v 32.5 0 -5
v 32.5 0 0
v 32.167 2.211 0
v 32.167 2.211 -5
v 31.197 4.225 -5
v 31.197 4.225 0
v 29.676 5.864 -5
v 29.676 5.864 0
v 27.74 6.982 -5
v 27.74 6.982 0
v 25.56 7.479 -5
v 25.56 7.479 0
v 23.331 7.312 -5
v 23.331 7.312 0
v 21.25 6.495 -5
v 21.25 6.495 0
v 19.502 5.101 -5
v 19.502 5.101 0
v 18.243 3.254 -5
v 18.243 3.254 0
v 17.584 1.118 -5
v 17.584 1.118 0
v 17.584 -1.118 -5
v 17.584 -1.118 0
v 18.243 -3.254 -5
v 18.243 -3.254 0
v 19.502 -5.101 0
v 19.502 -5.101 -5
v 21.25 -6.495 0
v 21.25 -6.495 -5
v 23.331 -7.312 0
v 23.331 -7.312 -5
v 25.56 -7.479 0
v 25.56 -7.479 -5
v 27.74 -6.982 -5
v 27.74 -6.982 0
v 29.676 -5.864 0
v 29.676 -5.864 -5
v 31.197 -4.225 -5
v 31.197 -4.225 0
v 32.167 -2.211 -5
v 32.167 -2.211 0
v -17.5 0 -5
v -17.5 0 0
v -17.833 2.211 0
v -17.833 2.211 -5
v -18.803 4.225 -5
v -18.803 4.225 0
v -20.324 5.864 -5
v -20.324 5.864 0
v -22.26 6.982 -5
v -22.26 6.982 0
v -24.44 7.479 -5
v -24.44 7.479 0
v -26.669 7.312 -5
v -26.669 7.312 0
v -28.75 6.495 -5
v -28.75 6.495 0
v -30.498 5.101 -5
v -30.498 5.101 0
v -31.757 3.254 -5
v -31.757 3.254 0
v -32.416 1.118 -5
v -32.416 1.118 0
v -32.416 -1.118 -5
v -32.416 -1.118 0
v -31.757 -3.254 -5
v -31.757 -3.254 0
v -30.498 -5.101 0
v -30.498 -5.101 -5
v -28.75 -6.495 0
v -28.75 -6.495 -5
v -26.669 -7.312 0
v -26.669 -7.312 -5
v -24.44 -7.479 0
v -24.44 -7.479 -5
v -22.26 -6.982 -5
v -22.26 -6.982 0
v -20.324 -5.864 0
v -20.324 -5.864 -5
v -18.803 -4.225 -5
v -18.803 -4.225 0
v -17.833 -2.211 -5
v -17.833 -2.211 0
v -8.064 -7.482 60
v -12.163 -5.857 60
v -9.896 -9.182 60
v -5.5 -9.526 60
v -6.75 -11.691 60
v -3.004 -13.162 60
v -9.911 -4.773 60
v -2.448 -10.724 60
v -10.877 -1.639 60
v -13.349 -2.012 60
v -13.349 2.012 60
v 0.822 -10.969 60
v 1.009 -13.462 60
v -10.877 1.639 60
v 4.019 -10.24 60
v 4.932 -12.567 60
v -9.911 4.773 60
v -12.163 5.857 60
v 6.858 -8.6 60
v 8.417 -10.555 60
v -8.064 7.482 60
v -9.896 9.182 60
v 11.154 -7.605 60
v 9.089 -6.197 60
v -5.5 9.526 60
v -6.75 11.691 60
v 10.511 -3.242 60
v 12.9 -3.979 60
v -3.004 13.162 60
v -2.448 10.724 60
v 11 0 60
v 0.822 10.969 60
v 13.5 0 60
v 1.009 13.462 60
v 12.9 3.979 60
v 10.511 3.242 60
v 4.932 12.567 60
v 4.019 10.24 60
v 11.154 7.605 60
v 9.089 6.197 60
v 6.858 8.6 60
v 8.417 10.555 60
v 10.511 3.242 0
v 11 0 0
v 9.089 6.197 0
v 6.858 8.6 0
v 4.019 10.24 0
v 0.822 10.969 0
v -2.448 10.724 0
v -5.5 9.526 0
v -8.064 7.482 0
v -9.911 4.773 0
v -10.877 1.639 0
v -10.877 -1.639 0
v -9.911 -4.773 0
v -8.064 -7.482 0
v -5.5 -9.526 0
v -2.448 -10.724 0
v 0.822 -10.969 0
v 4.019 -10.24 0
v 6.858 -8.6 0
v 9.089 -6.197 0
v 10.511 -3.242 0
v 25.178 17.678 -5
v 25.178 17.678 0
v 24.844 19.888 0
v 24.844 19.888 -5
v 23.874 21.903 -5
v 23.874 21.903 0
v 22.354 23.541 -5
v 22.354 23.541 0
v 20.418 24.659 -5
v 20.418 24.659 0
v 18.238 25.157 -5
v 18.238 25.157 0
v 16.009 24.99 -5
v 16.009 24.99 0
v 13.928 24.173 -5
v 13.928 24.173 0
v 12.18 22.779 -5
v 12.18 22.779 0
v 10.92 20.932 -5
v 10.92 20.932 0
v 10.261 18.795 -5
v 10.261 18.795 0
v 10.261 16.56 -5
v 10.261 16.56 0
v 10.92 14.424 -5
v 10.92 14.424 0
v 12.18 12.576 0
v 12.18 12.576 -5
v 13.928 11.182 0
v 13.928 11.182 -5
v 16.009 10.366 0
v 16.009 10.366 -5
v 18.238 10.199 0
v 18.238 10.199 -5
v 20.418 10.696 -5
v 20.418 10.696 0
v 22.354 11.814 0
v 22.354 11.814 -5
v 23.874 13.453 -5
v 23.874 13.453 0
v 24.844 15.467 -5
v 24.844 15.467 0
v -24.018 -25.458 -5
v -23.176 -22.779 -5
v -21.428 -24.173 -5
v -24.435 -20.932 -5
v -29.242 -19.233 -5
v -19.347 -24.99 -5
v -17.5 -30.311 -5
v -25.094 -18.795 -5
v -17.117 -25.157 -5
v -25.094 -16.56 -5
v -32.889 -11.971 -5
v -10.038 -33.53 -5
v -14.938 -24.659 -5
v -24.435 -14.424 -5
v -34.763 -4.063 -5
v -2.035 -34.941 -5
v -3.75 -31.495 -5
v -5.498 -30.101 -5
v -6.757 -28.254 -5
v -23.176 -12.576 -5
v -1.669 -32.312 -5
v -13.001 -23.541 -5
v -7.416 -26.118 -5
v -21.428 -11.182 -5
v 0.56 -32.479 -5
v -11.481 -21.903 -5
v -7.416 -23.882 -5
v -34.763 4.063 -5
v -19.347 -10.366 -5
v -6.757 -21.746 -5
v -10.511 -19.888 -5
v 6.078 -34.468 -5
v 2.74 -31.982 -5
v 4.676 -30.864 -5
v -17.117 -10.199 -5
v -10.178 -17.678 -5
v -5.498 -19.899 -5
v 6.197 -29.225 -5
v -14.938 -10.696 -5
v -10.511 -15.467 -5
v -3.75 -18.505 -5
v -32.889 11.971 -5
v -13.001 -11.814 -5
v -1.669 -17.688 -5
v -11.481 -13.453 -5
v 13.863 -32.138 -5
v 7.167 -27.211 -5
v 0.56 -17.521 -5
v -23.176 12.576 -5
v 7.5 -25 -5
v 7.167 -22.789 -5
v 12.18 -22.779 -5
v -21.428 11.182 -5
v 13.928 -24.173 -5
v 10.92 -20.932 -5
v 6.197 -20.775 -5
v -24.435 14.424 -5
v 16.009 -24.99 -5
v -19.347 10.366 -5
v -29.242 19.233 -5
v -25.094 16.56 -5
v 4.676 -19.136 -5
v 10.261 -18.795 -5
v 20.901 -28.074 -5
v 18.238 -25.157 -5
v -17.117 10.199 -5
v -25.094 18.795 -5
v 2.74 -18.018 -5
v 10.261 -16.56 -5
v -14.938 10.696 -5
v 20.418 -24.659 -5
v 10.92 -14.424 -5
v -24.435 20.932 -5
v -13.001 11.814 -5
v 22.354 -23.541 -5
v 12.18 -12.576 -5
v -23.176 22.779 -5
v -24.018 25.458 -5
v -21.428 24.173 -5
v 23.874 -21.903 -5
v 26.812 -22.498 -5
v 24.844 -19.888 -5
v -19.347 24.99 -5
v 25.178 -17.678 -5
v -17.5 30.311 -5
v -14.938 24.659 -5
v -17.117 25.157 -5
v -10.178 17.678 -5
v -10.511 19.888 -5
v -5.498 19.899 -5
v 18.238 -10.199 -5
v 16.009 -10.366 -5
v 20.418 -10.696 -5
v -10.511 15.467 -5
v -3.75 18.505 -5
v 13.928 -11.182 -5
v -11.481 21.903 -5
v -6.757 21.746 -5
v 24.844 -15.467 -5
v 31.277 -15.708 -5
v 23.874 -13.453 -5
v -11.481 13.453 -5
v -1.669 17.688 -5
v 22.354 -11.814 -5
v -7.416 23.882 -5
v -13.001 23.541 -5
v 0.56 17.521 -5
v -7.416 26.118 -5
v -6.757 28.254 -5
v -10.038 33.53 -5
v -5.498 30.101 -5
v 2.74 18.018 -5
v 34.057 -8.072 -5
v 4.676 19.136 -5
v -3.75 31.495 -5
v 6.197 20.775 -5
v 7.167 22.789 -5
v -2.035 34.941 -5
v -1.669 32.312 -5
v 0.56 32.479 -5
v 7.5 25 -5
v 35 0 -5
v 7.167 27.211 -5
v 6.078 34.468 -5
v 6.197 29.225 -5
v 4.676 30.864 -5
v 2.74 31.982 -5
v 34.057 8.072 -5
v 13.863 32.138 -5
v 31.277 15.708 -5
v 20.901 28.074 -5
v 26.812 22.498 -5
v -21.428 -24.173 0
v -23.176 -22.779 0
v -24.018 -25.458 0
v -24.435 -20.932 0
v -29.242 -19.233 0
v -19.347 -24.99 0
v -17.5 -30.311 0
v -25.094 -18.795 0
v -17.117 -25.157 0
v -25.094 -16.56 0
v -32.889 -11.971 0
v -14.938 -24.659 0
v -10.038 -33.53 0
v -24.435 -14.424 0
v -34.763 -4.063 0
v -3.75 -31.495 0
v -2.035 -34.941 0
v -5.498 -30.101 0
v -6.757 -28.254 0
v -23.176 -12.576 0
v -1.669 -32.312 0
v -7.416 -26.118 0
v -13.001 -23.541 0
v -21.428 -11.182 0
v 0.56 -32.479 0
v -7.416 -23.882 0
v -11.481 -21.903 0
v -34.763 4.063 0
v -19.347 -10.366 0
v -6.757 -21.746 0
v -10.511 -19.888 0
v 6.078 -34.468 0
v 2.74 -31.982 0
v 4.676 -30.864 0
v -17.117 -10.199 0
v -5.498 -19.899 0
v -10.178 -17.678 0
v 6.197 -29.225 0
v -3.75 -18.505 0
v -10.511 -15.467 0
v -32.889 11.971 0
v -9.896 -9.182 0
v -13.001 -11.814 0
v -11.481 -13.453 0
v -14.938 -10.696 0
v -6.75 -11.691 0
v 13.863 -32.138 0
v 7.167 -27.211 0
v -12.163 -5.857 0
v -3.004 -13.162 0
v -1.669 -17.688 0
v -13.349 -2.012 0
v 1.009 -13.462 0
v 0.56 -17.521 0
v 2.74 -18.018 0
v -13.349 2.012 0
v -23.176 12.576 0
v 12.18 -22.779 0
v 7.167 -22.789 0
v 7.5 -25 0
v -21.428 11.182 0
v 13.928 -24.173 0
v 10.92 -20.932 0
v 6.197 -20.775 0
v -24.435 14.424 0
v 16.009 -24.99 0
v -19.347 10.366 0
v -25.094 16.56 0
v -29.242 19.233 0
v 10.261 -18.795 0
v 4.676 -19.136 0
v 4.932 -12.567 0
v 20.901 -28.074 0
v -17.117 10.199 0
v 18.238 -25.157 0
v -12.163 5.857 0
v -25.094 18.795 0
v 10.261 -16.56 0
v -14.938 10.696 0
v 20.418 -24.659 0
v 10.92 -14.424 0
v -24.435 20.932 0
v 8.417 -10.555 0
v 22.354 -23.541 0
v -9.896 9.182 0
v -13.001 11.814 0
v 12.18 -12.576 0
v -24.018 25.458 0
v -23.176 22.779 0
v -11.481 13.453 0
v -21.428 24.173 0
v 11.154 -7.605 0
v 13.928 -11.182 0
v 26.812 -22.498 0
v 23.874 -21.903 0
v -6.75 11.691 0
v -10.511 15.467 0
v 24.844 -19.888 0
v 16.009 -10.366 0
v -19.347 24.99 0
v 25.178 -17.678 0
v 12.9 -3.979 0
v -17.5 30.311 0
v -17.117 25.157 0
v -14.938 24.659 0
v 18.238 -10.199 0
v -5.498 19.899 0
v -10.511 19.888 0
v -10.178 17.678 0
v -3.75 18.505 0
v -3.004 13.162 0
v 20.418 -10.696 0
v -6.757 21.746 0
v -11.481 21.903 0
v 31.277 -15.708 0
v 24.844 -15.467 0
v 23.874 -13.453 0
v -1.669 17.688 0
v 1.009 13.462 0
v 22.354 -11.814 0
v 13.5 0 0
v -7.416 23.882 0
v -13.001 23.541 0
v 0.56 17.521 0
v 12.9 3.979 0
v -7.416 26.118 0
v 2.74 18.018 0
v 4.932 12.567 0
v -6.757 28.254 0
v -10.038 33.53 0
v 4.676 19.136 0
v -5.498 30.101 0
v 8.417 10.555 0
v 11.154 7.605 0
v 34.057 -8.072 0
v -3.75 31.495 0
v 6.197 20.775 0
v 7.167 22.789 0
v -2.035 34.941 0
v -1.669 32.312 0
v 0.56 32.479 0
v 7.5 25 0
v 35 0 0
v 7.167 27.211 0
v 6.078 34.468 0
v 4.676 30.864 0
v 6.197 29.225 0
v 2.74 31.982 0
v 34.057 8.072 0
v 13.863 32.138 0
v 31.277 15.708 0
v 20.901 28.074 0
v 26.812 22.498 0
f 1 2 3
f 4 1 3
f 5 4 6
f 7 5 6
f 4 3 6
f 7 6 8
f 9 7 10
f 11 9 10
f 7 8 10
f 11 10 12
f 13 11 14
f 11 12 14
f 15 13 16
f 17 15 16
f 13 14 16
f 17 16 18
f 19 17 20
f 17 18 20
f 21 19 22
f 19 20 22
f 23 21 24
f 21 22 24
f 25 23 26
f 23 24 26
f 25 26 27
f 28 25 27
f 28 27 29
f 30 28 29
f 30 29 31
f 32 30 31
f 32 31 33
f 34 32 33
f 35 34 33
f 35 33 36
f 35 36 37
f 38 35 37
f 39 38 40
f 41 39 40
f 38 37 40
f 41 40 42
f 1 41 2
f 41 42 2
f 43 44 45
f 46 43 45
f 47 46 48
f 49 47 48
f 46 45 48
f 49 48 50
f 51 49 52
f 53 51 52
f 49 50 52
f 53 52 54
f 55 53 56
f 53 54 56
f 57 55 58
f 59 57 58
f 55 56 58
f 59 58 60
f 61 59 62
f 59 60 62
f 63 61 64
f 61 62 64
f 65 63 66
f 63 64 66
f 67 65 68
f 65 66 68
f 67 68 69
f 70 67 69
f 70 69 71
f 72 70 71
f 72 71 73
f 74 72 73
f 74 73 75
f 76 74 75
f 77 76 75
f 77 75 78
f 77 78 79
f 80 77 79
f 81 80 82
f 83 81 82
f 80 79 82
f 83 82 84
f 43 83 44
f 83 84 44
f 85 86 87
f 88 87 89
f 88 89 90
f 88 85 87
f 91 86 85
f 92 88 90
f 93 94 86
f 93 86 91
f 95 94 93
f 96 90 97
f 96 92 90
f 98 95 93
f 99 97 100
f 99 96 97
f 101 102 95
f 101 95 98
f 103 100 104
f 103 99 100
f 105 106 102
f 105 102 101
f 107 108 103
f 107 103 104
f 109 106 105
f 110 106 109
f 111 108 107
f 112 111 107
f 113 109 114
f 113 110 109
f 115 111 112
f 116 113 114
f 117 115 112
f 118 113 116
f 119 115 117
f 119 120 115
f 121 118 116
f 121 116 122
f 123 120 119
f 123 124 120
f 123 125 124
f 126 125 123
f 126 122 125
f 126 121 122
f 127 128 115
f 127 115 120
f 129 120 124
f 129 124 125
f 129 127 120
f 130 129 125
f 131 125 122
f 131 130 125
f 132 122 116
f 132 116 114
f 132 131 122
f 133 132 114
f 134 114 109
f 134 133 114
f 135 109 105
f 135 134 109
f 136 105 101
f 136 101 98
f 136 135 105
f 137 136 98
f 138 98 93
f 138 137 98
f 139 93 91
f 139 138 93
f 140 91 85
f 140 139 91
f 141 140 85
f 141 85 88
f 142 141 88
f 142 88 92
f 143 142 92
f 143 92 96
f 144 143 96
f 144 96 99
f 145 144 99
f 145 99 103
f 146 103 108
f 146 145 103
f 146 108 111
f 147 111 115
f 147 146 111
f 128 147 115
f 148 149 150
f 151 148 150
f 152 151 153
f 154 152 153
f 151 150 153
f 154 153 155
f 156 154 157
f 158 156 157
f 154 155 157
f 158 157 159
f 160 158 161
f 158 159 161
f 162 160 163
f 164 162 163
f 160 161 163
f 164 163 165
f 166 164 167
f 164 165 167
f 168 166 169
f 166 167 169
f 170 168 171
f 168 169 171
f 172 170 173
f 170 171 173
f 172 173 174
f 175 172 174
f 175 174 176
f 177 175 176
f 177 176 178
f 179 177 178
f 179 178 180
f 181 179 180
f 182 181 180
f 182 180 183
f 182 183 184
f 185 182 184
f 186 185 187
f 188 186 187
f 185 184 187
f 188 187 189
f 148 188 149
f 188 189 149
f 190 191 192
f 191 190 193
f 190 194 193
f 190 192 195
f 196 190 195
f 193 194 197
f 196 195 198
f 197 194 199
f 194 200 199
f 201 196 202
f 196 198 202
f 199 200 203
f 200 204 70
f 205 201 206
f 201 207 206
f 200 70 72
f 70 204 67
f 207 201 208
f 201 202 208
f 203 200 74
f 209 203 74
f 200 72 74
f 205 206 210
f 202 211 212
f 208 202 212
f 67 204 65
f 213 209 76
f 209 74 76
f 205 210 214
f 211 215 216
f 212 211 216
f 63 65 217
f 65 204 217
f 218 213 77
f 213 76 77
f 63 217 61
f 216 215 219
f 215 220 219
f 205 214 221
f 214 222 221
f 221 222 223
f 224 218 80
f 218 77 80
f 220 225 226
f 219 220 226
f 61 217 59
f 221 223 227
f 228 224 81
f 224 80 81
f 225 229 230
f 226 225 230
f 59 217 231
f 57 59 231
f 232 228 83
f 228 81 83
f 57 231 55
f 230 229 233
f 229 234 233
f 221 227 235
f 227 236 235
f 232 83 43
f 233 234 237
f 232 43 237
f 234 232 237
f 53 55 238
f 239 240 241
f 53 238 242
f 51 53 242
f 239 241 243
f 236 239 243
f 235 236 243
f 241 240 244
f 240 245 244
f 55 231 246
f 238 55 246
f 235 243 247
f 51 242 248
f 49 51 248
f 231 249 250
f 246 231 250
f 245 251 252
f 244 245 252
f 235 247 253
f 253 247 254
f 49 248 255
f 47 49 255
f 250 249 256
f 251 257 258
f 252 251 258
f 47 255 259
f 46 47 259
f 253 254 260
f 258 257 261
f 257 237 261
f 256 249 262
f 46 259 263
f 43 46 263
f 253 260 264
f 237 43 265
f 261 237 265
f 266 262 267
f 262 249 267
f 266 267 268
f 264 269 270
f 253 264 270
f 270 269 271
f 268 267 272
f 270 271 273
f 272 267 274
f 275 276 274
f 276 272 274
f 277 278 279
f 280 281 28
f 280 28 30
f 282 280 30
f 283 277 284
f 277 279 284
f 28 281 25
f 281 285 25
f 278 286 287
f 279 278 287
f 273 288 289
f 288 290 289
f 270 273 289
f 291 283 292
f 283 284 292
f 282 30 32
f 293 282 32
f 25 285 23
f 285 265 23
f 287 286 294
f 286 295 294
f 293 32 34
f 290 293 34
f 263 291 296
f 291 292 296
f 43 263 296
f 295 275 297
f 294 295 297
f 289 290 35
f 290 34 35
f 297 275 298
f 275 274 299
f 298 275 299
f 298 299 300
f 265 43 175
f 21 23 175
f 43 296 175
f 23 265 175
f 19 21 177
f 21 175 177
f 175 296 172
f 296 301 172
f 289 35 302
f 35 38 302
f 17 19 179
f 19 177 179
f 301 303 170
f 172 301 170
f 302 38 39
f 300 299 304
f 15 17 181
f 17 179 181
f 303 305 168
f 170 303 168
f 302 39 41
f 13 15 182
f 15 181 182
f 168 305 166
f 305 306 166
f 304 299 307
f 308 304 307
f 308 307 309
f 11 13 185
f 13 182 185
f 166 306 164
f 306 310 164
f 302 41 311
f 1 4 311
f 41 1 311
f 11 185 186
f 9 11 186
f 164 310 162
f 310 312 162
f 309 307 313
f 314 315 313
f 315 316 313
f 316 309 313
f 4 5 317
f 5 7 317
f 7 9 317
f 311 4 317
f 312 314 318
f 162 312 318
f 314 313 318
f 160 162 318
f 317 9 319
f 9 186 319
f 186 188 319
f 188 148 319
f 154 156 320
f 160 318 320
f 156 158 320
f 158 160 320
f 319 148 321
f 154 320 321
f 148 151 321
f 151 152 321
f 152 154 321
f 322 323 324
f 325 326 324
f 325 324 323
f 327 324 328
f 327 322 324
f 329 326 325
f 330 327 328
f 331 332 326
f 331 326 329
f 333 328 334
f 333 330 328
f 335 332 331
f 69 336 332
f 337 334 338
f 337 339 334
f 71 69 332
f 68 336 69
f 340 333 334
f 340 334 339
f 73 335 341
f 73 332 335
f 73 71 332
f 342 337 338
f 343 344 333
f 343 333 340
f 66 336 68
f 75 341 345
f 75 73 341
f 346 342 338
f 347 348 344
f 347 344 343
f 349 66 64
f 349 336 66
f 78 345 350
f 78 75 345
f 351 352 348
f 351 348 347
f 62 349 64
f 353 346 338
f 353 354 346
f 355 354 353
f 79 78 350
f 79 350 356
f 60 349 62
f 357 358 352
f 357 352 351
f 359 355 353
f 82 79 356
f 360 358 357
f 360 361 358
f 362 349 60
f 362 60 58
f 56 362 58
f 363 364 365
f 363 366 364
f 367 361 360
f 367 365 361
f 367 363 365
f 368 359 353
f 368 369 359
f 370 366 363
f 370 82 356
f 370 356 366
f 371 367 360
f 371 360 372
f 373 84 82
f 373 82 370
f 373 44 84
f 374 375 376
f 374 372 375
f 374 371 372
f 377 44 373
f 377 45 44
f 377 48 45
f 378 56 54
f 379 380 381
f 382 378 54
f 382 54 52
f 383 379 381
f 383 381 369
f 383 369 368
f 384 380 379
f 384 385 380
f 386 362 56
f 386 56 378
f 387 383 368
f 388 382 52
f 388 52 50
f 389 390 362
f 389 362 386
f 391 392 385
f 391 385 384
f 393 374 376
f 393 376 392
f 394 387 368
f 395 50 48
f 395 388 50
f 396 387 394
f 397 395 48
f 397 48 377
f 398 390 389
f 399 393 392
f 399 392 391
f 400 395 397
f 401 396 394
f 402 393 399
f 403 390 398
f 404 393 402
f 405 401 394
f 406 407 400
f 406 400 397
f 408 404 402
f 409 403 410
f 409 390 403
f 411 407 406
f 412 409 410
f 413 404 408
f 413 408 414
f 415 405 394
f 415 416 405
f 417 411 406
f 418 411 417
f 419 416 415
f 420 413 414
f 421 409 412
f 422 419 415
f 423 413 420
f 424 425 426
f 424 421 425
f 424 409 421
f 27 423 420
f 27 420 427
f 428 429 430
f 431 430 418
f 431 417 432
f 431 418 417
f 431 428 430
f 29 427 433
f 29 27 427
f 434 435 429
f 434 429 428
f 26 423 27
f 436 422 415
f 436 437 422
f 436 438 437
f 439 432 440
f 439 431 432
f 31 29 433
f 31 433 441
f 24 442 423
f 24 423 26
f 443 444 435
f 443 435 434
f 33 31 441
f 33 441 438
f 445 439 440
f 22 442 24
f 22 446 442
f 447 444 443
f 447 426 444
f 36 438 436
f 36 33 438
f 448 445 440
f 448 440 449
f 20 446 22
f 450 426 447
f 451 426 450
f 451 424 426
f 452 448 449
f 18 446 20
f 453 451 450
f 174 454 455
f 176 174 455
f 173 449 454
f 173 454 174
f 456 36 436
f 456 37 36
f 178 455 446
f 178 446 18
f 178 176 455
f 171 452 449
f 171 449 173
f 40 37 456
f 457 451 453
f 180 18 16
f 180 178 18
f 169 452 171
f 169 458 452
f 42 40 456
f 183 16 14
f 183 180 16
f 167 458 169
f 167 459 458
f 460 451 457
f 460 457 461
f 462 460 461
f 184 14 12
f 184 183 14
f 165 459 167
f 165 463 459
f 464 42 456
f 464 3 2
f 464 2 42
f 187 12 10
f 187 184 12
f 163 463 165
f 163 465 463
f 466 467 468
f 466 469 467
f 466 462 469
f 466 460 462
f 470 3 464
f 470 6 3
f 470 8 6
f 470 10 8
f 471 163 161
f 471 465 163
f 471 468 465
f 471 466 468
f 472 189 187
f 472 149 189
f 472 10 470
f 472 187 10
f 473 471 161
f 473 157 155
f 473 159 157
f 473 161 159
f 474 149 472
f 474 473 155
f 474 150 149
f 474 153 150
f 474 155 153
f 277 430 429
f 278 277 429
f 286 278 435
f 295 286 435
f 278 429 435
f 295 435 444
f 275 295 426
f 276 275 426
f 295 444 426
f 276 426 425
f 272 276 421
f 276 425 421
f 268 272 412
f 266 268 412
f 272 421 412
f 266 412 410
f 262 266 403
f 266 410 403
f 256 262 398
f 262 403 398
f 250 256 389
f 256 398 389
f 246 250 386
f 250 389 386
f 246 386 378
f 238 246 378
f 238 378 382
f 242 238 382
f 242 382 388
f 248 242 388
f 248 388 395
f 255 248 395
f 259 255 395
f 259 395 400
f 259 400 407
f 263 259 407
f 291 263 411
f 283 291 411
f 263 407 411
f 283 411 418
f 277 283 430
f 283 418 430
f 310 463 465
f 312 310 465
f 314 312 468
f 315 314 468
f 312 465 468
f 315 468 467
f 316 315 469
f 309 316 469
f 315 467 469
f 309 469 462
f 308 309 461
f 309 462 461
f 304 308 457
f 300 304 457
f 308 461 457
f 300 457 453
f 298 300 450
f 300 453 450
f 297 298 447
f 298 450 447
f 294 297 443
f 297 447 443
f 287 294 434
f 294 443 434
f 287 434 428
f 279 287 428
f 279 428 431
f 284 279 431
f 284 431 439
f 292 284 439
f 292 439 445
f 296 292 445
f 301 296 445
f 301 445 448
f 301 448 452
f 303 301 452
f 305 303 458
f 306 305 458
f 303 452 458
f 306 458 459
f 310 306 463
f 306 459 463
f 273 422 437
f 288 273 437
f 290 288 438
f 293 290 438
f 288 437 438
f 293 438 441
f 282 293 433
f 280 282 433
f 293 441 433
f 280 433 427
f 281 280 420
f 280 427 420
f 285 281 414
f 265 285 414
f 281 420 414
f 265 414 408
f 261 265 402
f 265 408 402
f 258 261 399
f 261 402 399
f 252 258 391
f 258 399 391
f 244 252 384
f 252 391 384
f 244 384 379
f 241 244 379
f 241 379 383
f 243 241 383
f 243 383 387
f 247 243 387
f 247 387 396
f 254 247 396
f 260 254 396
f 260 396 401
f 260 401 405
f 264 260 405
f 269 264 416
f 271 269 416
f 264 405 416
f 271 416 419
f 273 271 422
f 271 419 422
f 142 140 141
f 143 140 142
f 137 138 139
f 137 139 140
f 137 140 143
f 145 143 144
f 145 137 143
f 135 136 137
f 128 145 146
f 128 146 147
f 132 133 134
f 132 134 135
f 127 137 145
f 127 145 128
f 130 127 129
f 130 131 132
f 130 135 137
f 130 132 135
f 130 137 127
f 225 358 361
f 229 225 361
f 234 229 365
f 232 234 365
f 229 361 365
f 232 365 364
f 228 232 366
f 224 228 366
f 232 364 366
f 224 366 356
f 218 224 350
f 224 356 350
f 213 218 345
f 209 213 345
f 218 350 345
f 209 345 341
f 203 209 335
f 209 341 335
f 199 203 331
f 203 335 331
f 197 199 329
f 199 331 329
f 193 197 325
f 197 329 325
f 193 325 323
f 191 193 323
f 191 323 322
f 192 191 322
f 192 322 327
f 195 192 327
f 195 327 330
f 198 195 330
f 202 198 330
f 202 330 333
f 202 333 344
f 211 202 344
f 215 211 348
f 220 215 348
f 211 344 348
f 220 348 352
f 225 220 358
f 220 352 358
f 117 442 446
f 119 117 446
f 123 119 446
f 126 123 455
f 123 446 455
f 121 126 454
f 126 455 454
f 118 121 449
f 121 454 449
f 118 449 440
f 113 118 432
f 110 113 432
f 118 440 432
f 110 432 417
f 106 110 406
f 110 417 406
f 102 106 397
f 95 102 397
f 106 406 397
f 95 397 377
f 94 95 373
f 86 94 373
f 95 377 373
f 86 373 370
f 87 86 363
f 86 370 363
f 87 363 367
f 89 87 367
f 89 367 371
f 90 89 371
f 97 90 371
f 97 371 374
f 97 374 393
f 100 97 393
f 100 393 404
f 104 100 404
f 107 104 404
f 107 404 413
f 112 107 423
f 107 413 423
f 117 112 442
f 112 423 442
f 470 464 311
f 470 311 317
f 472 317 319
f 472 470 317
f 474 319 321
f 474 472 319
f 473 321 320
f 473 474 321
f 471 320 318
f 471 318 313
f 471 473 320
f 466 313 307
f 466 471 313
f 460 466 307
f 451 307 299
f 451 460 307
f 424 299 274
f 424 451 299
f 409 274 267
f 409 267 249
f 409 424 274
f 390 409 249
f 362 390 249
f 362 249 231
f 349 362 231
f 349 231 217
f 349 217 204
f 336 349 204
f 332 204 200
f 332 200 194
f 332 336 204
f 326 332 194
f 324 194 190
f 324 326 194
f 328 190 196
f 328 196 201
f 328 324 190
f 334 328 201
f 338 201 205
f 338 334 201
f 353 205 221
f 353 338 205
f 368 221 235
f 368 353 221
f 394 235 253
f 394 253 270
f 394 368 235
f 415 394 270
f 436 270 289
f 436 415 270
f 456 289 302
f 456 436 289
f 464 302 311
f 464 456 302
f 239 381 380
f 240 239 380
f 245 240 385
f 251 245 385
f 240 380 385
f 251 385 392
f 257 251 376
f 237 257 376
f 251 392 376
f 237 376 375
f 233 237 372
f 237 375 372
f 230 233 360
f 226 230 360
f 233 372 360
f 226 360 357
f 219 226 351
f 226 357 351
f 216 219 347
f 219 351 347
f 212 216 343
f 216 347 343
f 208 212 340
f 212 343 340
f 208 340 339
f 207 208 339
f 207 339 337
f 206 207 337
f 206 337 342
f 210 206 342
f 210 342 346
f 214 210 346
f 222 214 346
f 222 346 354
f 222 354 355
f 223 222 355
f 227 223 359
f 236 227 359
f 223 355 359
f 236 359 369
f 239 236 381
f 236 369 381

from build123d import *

# Parameters (mm, degrees)
F0_R     = 35
F0_R_2   = 7.5
F0_R_3   = 13.5
F0_R_4   = 11
F1_DEPTH = 5
F2_DEPTH = 60


with BuildPart() as f1:
    # F0 (on Top) → F1 (new body)
    with BuildSketch(Plane.XY):
        Circle(F0_R)
        with Locations((-17.67767, -17.67767)):
            Circle(F0_R_2, mode=Mode.SUBTRACT)
        with Locations((0, -25)):
            Circle(F0_R_2, mode=Mode.SUBTRACT)
        with Locations((17.67767, -17.67767)):
            Circle(F0_R_2, mode=Mode.SUBTRACT)
        with Locations((-25, 0)):
            Circle(F0_R_2, mode=Mode.SUBTRACT)
        with Locations((-17.67767, 17.67767)):
            Circle(F0_R_2, mode=Mode.SUBTRACT)
        Circle(F0_R_3, mode=Mode.SUBTRACT)
        with Locations((25, 0)):
            Circle(F0_R_2, mode=Mode.SUBTRACT)
        with Locations((0, 25)):
            Circle(F0_R_2, mode=Mode.SUBTRACT)
        with Locations((17.67767, 17.67767)):
            Circle(F0_R_2, mode=Mode.SUBTRACT)
        Circle(F0_R_3)
        Circle(F0_R_4, mode=Mode.SUBTRACT)
        Circle(F0_R_4)
    extrude(amount=-F1_DEPTH)

    # F0 (on Top) → F2 (join)
    with BuildSketch(Plane.XY):
        Circle(F0_R_3)
        Circle(F0_R_4, mode=Mode.SUBTRACT)
    extrude(amount=F2_DEPTH)


solid = f1.part
